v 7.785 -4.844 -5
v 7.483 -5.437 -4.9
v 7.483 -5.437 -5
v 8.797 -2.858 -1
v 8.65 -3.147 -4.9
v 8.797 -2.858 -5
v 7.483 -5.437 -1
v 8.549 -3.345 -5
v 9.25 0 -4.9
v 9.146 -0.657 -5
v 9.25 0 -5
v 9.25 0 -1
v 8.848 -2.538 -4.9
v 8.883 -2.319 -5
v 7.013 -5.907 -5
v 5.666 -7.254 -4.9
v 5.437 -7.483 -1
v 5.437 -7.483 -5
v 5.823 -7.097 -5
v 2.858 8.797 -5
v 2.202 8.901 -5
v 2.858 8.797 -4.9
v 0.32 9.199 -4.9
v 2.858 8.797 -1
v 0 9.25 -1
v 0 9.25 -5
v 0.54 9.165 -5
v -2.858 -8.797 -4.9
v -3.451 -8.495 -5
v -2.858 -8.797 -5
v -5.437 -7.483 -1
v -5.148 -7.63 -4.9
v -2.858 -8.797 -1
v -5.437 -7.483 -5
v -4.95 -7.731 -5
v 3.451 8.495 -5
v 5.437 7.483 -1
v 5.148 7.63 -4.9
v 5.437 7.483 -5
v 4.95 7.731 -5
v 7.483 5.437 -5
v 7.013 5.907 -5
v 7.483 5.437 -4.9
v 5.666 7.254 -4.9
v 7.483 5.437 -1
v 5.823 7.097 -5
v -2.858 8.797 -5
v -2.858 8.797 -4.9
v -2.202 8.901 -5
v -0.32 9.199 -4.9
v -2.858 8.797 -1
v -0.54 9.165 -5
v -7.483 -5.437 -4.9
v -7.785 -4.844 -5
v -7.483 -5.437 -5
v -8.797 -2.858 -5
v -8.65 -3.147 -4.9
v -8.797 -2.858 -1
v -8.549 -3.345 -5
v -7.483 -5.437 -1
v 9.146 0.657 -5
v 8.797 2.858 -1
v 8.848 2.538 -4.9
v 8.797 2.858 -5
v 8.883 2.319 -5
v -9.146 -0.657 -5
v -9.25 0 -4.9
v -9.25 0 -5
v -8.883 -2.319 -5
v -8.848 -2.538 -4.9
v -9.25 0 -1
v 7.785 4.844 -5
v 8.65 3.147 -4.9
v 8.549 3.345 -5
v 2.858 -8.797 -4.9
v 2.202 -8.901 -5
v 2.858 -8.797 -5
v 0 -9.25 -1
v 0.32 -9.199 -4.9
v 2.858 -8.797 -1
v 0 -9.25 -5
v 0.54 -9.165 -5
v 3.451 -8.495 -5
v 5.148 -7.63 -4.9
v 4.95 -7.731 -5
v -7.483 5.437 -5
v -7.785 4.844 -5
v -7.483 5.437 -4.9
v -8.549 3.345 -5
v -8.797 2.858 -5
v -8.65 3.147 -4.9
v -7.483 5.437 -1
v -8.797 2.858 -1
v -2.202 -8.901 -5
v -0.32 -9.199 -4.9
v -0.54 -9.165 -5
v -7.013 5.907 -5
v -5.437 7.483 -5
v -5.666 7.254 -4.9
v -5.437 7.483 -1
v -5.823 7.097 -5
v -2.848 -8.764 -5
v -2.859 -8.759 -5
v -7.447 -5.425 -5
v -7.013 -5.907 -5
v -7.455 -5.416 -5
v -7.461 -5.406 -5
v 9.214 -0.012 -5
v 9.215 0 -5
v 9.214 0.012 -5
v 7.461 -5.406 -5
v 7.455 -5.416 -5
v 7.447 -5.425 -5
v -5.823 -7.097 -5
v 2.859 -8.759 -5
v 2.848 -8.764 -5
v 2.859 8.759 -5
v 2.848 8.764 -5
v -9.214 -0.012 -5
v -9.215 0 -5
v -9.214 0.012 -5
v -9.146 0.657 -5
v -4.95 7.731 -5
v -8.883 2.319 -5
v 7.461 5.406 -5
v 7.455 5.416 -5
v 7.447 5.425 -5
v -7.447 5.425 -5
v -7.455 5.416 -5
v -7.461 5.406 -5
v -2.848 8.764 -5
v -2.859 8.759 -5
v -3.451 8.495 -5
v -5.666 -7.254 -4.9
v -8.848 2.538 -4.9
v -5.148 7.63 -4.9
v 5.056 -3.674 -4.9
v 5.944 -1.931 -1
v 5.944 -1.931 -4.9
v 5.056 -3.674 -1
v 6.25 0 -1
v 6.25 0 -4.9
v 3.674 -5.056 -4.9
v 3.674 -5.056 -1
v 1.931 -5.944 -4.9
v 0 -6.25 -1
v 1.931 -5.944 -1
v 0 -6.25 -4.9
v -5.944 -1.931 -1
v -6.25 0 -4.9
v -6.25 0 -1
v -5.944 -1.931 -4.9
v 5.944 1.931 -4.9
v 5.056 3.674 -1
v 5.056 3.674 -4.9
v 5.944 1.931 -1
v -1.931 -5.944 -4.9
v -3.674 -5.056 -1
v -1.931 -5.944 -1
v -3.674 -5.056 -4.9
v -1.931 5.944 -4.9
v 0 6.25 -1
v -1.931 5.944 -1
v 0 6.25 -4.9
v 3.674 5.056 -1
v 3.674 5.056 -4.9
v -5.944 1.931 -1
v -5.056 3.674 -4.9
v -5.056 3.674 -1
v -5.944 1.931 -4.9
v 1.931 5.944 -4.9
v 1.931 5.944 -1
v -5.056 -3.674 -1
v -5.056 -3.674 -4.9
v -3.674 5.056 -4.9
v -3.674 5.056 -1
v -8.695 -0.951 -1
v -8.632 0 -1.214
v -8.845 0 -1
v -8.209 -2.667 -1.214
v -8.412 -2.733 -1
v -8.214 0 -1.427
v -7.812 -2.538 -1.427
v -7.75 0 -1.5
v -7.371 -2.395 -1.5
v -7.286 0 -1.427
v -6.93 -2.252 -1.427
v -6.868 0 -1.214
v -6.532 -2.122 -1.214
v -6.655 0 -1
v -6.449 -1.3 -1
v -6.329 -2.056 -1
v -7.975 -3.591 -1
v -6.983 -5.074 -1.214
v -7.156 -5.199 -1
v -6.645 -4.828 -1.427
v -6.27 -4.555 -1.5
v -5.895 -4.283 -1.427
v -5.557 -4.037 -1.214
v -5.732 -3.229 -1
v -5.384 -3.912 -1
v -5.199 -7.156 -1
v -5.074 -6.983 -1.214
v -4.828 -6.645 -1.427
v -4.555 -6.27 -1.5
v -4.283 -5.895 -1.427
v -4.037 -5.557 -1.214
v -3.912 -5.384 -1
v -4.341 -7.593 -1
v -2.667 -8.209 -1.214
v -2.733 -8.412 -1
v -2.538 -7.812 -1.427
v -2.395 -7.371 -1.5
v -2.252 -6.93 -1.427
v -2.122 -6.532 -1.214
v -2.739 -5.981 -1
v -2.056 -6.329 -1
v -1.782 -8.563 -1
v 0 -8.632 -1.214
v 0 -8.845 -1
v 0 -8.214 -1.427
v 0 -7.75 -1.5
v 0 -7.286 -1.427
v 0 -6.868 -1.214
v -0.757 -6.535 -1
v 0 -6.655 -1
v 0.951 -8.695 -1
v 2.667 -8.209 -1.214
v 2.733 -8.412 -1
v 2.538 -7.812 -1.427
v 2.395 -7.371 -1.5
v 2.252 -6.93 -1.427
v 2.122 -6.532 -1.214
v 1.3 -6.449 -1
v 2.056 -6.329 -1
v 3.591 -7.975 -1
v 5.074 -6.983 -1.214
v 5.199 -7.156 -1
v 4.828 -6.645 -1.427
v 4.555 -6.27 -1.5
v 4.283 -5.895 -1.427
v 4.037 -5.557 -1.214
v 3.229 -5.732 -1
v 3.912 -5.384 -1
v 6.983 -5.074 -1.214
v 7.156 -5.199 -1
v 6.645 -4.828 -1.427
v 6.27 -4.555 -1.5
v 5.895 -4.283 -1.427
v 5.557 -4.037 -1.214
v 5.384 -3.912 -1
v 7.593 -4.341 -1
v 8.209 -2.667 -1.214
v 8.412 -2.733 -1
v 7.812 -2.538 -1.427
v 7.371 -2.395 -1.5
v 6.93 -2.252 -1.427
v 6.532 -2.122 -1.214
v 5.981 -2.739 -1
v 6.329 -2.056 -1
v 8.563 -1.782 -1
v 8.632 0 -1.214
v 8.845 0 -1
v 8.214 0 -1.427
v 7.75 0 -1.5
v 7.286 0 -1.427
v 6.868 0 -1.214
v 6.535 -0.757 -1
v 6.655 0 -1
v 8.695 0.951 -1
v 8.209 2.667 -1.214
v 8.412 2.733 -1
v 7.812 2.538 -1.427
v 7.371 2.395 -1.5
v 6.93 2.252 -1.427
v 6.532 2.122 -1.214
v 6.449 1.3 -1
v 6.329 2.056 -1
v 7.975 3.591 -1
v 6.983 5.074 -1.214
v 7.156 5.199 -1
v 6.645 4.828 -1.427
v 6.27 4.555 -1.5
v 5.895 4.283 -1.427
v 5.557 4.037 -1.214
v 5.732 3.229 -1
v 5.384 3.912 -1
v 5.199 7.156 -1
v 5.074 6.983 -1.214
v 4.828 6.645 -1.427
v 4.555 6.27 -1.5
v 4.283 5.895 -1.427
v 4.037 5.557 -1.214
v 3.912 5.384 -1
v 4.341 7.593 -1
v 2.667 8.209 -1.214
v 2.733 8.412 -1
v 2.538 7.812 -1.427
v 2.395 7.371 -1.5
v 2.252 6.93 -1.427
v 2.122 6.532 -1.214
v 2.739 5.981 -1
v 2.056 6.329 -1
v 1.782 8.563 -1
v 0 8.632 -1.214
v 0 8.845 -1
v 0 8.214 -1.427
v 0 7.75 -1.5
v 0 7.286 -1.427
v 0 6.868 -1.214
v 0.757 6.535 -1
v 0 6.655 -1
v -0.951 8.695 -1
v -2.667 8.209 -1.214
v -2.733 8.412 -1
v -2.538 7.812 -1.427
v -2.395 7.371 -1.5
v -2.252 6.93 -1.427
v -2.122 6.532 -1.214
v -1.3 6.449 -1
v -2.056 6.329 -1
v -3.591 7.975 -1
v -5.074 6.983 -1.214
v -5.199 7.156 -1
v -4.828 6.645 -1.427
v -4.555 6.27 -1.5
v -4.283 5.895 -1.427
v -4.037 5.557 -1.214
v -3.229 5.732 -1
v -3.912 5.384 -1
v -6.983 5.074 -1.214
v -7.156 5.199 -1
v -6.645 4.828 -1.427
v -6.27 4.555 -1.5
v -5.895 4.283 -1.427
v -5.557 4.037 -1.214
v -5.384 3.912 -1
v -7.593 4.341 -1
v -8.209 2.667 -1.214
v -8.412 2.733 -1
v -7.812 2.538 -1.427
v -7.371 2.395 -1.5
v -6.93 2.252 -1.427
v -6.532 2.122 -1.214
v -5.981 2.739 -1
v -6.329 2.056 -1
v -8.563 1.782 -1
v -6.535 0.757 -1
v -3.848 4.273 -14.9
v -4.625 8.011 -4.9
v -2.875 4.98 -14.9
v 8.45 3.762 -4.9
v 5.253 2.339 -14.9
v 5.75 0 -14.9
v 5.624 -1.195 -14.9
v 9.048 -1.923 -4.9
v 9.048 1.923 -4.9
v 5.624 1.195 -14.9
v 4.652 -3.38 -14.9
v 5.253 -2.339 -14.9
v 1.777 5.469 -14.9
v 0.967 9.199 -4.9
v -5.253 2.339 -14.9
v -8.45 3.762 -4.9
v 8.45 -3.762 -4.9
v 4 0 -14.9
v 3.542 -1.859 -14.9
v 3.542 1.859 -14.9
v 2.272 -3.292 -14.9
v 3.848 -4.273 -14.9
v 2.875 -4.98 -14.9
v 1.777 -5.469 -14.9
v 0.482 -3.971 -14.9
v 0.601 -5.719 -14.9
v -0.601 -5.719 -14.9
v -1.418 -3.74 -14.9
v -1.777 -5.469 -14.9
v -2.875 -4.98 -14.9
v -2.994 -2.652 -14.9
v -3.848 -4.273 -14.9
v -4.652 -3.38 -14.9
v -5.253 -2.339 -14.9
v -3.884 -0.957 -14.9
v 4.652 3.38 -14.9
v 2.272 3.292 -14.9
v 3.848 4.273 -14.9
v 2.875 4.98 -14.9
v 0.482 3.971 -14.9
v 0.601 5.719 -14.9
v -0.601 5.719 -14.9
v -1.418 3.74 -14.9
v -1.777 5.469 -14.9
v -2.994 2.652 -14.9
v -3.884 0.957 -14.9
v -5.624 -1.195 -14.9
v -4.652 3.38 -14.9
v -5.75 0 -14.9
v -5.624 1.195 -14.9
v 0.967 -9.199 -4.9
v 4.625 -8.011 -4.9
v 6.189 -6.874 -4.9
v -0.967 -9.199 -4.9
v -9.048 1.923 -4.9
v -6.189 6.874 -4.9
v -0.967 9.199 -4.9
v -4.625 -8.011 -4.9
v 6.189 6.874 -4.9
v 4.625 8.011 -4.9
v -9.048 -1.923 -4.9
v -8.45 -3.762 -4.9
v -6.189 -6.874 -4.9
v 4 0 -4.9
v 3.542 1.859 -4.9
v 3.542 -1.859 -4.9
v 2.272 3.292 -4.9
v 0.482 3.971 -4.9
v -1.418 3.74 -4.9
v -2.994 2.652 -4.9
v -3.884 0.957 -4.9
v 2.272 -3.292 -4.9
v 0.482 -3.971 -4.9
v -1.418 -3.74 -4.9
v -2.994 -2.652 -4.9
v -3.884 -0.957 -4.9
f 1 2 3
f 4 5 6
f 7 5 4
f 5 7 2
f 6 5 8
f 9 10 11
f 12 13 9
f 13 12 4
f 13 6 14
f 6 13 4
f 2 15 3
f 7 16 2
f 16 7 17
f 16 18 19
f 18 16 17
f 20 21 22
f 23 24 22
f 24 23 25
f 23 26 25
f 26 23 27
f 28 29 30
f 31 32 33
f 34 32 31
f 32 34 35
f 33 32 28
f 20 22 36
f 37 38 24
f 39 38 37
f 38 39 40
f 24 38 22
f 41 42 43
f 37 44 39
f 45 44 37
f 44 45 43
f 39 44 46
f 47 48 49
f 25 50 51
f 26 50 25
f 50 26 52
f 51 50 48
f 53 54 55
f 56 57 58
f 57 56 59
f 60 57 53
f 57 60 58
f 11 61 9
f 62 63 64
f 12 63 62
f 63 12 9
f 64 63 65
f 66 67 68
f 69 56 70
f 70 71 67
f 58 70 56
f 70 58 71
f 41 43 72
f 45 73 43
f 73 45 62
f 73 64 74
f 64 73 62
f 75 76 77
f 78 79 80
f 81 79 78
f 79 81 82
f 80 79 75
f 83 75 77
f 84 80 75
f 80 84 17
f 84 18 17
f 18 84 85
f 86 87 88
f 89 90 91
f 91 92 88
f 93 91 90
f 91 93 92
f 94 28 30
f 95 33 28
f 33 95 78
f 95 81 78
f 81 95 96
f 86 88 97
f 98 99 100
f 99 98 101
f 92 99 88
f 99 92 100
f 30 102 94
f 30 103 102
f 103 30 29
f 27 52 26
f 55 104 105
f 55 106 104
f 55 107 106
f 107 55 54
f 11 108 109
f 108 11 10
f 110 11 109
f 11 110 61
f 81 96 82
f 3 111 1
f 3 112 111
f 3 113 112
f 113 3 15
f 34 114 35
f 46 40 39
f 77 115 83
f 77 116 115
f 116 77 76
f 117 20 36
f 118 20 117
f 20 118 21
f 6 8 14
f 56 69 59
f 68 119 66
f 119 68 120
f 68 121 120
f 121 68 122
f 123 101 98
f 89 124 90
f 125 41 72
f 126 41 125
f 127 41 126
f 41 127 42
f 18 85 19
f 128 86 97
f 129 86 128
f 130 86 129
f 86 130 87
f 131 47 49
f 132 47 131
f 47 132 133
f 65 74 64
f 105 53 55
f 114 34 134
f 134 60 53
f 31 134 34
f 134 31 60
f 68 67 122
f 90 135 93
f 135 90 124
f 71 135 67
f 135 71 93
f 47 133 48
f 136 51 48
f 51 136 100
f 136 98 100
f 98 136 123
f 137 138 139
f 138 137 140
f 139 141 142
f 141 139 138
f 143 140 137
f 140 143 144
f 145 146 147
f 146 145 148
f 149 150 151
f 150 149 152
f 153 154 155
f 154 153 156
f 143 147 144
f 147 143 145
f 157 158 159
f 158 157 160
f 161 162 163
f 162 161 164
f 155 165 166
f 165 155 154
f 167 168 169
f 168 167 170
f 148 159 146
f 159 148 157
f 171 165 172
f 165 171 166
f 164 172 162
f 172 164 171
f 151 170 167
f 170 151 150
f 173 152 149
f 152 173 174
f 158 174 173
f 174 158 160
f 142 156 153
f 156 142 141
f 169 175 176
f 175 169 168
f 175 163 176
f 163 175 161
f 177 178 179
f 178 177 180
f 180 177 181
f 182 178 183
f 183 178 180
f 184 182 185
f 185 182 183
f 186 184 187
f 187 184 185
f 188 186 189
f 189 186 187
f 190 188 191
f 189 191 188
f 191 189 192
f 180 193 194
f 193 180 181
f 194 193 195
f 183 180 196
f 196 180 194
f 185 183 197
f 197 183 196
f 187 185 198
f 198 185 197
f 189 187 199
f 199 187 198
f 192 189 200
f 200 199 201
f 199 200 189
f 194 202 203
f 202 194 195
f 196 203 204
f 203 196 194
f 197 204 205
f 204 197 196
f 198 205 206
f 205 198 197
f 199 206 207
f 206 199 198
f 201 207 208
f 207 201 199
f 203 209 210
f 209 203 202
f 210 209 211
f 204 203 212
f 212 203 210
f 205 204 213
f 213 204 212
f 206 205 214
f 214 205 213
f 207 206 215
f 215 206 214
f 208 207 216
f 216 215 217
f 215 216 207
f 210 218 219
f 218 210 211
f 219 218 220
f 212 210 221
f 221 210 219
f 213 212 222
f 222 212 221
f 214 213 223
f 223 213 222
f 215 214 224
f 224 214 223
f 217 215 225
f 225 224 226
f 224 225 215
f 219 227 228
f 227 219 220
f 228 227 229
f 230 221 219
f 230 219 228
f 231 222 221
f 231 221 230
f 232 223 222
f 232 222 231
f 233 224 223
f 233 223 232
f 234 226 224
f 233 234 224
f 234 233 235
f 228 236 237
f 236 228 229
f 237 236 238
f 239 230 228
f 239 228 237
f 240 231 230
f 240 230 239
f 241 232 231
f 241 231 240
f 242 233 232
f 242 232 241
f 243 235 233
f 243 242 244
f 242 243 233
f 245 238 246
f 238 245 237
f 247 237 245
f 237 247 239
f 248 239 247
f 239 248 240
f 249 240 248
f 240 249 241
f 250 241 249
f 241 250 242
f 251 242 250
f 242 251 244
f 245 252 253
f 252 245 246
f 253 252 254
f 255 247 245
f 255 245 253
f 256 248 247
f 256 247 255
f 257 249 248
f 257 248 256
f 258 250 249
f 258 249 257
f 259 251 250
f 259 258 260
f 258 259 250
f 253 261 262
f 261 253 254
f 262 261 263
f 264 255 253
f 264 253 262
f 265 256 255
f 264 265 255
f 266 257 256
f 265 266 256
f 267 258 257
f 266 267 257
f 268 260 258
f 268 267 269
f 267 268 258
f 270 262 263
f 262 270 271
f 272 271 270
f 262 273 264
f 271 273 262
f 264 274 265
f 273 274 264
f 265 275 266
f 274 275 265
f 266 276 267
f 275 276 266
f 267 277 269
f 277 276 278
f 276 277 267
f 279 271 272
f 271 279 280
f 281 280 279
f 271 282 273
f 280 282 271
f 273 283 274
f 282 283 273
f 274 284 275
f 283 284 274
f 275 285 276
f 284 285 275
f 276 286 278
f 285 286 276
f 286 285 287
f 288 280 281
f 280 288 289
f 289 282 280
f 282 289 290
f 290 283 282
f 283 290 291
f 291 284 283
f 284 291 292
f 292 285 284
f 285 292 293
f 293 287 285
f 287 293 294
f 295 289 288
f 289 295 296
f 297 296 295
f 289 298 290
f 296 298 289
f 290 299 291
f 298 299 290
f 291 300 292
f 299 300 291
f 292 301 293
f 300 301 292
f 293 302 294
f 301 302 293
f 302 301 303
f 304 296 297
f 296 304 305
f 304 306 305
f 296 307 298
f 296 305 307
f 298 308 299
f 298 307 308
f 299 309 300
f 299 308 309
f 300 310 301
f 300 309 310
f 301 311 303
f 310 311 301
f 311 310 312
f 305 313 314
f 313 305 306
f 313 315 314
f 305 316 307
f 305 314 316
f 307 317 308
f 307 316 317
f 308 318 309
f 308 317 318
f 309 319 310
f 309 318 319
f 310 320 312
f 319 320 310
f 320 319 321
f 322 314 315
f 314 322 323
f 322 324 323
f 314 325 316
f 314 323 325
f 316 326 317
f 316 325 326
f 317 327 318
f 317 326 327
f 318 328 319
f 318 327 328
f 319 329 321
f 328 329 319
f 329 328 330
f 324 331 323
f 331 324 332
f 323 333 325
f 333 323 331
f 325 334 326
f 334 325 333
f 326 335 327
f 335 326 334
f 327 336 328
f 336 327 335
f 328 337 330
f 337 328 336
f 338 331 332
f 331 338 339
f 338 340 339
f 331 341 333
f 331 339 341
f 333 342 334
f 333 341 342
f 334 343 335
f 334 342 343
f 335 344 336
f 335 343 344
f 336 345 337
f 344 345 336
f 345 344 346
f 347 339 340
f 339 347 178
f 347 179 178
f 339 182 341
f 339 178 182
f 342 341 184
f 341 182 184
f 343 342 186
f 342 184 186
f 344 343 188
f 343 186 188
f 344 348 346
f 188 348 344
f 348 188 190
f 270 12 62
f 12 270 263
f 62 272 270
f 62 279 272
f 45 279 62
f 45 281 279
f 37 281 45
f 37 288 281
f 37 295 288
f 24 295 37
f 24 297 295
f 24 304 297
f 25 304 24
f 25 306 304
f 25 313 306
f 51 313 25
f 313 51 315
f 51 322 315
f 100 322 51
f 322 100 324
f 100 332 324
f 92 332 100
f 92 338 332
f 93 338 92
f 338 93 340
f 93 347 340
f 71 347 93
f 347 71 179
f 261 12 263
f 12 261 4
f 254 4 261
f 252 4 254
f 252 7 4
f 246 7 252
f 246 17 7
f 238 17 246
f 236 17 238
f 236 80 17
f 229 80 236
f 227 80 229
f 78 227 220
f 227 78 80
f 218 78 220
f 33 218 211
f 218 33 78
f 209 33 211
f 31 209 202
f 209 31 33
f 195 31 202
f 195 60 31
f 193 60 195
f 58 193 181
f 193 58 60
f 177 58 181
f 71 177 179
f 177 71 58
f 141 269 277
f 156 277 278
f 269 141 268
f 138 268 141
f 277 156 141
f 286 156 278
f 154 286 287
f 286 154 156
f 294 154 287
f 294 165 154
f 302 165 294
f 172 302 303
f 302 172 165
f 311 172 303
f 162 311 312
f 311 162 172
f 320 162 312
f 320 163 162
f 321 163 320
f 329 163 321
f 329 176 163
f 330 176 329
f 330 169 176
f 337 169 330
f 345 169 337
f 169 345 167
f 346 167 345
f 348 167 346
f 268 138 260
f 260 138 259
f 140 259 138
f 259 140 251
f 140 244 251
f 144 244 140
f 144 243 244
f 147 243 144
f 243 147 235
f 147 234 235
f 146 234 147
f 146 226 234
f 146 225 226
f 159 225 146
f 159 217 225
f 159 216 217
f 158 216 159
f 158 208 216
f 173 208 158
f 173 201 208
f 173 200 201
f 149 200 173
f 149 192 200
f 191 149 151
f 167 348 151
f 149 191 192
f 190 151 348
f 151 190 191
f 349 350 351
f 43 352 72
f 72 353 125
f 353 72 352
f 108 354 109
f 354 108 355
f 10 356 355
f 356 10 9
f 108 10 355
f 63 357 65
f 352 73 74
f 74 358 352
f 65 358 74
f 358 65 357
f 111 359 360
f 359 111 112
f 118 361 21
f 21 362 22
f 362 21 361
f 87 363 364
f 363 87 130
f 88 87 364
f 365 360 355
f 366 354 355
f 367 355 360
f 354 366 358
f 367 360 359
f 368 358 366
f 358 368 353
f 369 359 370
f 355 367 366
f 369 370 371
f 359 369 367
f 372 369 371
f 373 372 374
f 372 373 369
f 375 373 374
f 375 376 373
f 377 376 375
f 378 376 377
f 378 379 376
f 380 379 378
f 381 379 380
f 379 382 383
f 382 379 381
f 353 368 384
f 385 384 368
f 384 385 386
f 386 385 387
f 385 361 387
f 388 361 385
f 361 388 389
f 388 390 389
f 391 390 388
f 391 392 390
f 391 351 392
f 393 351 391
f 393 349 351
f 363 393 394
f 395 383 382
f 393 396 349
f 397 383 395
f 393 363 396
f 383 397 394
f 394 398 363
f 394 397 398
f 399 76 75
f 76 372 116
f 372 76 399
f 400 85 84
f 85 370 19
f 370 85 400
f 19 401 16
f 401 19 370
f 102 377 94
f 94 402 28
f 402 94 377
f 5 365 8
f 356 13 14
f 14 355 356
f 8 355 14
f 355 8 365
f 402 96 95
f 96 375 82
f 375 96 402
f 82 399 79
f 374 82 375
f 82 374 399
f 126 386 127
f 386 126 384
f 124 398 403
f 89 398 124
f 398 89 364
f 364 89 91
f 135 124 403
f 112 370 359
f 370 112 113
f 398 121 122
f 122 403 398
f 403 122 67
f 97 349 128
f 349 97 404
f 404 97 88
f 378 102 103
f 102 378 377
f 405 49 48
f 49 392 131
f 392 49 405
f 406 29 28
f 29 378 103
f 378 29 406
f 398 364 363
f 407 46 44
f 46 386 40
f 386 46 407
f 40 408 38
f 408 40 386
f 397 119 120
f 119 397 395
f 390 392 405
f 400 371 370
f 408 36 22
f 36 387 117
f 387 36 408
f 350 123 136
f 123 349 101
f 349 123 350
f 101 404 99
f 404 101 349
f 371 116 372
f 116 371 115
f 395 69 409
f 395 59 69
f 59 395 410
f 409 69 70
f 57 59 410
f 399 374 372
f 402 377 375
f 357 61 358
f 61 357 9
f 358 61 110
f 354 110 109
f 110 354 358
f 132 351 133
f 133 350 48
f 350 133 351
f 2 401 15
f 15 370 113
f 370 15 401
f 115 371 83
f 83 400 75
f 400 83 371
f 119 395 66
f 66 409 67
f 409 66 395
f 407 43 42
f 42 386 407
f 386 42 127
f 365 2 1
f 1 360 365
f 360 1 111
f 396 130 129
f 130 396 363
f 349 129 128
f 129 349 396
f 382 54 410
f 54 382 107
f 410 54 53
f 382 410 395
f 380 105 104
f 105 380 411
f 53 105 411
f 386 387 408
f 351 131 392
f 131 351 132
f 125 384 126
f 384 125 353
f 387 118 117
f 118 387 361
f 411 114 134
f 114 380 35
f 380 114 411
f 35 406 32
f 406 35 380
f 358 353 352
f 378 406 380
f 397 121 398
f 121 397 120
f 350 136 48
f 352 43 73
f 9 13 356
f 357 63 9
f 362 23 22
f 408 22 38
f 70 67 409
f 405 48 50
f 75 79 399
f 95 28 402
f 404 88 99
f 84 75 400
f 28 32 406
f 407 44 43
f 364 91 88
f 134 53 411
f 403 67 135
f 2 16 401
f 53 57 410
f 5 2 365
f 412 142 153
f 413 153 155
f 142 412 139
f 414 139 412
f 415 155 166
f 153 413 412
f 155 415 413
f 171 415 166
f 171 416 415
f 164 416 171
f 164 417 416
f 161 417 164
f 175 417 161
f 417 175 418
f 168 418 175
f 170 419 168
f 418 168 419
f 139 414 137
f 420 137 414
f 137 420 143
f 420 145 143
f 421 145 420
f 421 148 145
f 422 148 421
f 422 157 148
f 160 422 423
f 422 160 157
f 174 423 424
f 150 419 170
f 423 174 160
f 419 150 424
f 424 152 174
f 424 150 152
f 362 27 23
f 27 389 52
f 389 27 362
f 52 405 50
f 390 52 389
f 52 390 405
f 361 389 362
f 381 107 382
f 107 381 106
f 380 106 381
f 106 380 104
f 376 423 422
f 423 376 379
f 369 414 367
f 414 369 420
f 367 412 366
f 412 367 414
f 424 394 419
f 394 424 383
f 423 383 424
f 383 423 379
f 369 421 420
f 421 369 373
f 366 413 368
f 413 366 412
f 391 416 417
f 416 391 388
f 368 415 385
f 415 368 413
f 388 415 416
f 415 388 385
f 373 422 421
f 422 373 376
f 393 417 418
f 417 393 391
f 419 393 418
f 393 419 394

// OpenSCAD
// file: eggholder.scad
r_eggholder_ring = 15.5/2;
ri_eggholder_gummi = 3/2;

ri_eggholder_cyl = r_eggholder_ring - ri_eggholder_gummi;
ro_eggholder_cyl = r_eggholder_ring + ri_eggholder_gummi;
h_eggholder_cyl = 20;
h_eggholder_insideplate = 3;
mz_eggholder_insideplate = 3;
mz_eggholder_nemashaft_top = mz_eggholder_insideplate +h_eggholder_insideplate;

r_eggholder_shield=20;
h_eggholder_shield=4;

c_eggholder = "PeachPuff";

module eggholder_moveup(debug=true) {
    translate([0, 0, +mz_eggholder_nemashaft_top +h_nema_shaft])
    eggholder(debug);
}

module eggholder(debug=true) {

    color(c_eggholder)
    difference() {
        union() {

            // cylinder under gummi ring
            translate([0, 0, -h_eggholder_cyl])
            cylinder_with_hole(ri=ri_eggholder_cyl, ro=ro_eggholder_cyl,
                                h=h_eggholder_cyl, $fn=20);

            // protector agains brogen eggs
            color(c_eggholder)
            translate([0,0,-h_eggholder_cyl])
            cylinder(r=r_eggholder_shield, h=h_eggholder_shield);
        }

        // cut out torus for gummi
        torus(ri_eggholder_gummi, r_eggholder_ring);
        // smooth top of cylinder
        cube([2*ro_eggholder_cyl, 2*ro_eggholder_cyl, 2], center=true);

        // hole for nema shaft
        translate([0, 0, -mz_eggholder_nemashaft_top - h_nema_shaft ])
        nema17shaft();
    }


    // intermediate plate as max for motor shaft
    color(c_eggholder)
    translate([0, 0, -mz_eggholder_insideplate-h_eggholder_insideplate])
    cylinder(r=(ro_eggholder_cyl+ri_eggholder_cyl)/2,
             h=h_eggholder_insideplate);

    //// visible gummi ring
    //color(c_eggholder, 0.7)
    //torus(ri_eggholder_gummi, r_eggholder_ring);

    // visible nema shaft
    //color(c_eggholder, 0.7)
    //translate([0, 0, -mz_eggholder_nemashaft_top - h_nema_shaft ])
    //nema17shaft();
}

h_topeggholder_cyl1 = 5;
h_topeggholder_cyl2 = 10;
ro_topeggholder_cyl2 = 11.5/2;
ri_topeggholder_cyl2 = 4;

module topeggholder(debug=true) {
    color(c_eggholder)
    difference() {
        // cylinder under gummi ring
        translate([0, 0, 0])
        cylinder_with_hole(ri=ri_eggholder_cyl, ro=ro_eggholder_cyl,
                            h=h_topeggholder_cyl1, $fn=20);

        // cut out torus for gummi
        torus(ri_eggholder_gummi, r_eggholder_ring);
        // smooth top of cylinder
        cube([2*ro_eggholder_cyl, 2*ro_eggholder_cyl, 2], center=true);

    }

    // intermediate plate as max for shaft
    //translate([0, 0, mz_eggholder_insideplate])
    //cylinder(r=(ro_eggholder_cyl+ri_eggholder_cyl)/2,
    //         h=h_eggholder_insideplate);

    // visible gummi ring
    // color(c_eggholder, 0.7)
    // torus(ri_eggholder_gummi, r_eggholder_ring);

    // cylinder that touches to bearing
    color(c_eggholder)
    translate([0, 0, h_topeggholder_cyl1-0.1])
    difference() {
        cylinder(h=h_topeggholder_cyl2, r2=ro_topeggholder_cyl2,
                 r1 = ro_eggholder_cyl);
        translate([0, 0, -1])
        cylinder(h=h_topeggholder_cyl2+2, r=ri_topeggholder_cyl2);
    }

    if (debug) {
        cylinder_with_hole(ri=ri_topeggholder_cyl2, ro=ro_topeggholder_cyl2,
                            h=h_topeggholder_cyl2, $fn=20);
    }
}
// file: clamp.scad
module clamp(debug=true) {


    module lever(l_lever) {
        translate([-h_laserwood/2, 0, 0])
        rotate([90, 0, 90])
        linear_extrude(height=h_laserwood)
        polygon(points=[[0,0], // left bottom
                        [l_lever,0], // right bottom
                        [l_lever,h_lm8uu-5], // right top
                        [0,h_lm8uu]]); // left top

    }


    for(i = [-1, 1]) {
        rotate([90, 0, 0])
        translate([i*g_rod_centers/2, 0, 0])
        union() {
            bearing_with_mount(debug, c_clamp, a_clamp);
            //spring(height=g_clamp_topbar);
        }
    }

    l_lever = sqrt((g_bearing_mount_egg_y)*(g_bearing_mount_egg_y)
                   + g_rods_inner/2*g_rods_inner/2);


    color(c_clamp, a_clamp)
    translate([0, d_bearing_mount,0])
    union() {

        // connection peace between the two bearings
        w_connection_piece = (g_rods_inner - ro_lm8uu);
        translate([-g_bearing_mounts/2, -h_laserwood, 0])
        cube(size=[g_bearing_mounts, h_laserwood, l_bearing_mount], center=false);


        // egg top bearing holder
        translate([0, g_bearing_mount_egg_y, 0])
        union() {
            // z position of the bearing within the cylinder
            h_bearing_pos = (h_lm8uu-5)/2  - h_608zz/2;
            difference() {
                union() {
                    // cylinder that contains the 608zz
                    cylinder(h=h_lm8uu-5, r=14, center=false, $fn=20);

                    // the lever arms
                    for(i = [-1, 1]) {
                        translate([0, -g_bearing_mount_egg_y, 0])
                        translate([i*(g_rod_centers/2-15), -3, 0])
                        rotate([0, 0, i*10])
                        lever(l_lever);
                    }

                }

                // hole to insert 608zz bearing
                translate([0, 0, h_bearing_pos])
                k608zz_long();

                // hole to access 608zz bearing from top and bottom
                translate([0, 0, -h_lm8uu])
                cylinder(r=ri_608zz+2, h=2*h_lm8uu);
            }
            if (debug) {
                translate([0, 0, h_bearing_pos])
                k608zz();
            }
        }
    }

    if (debug) {
        // linear moving tooth
        translate([0, d_bearing_mount,0])
        union() {


            color(c_gears, a_gears)
            translate([g_bearing_mounts/2+w_bearing_mount-w_linearmoovingtooth, 0, -h_linearmoovingtooth+l_bearing_mount])
            cube(size=[w_linearmoovingtooth, d_gear, h_linearmoovingtooth], center=false);
        }
    }

}
// file: arm.scad
module arm_elevator_gear() {

    ri_screwheads_gap = r_gear * 0.57;
    ro_screwheads_gap = r_gear * 0.82;
    w_screwhead_gap_bridge = 10;

    difference() {
        // main
        cylinder(r=r_gear, h=d_gear);
        translate([0, 0, -1])
        cylinder(r=ro_screwheads_gap, h=d_gear + 2);
    }

    cylinder(r=ri_screwheads_gap, h=d_gear);


    for(i = [0, 1]) {
        rotate([0, 0, i*90])
        translate([-ro_screwheads_gap, -w_screwhead_gap_bridge/2, 0])
        cube(size=[ro_screwheads_gap*2, w_screwhead_gap_bridge, d_gear], center=false);
    }
}

module arm_elevator(debug=true) {

    for(i = [-1, 1]) {
        translate([i*g_rod_centers/2, 0, 0])
        union() {

            bearing_with_mount(debug);
        }
    }


    // plate to hold nema
    translate([0, 0, -d_bearing_mount])
    union() {
        difference() {
            translate([-g_bearing_mounts/2,0,0])
            cube([g_bearing_mounts, w_nema, d_arm_elevator_plate]);

            translate([0, w_nema/2, -1])
            union() {
                // hole for nema shaft
                cylinder(r=r_nema_big_cylinder, h=d_arm_elevator_plate+10);

                for(i=[-1,1]) {
                    for(j=[-1,1]) {
                        translate([i*31/2, j*31/2, 0])
                        cylinder(h=d_arm_elevator_plate+10, r=1, center=false, $fn=20);
                    }
                }
            }

        }
        if (debug) {
            // gear
            translate([0,w_nema/2,-d_gear])
            rotate([0,0,0])
            // color(c_gears, a_gears)
            arm_elevator_gear();
        }
    }

}


// | Motor Front
// | | 2mm Motor Front Cylinder Big
//   | | 4mm first holding plate
//     |   | 8mm gear ( 3mm depth, 2*0.5mm spacing)
//         |    | 13mm Housing outsite (5mm wood)
// |                   | 20mm End of shaft
//         |<  12mm   >| Shaft holding space
//         |<5 >|        Radius resticted holding space
//               |<5 >|  Lever body
//              || g_housingfront_lever
//               0

g_housingfront_lever = 1;
w_housingfront_slot = 14;
g_housingfront_arm = 1; // gap from lever arm to housing front

l_arm_second_extra_for_screw = 20;
h_nut = 4.7; // M5
w_nut = 8; // M5
ro_m5_screw = 4.2/2;

d_shaftholder_neg = g_gear + h_laserwood+g_housingfront_lever;
g_arm_hinge = 15;
d_arm_hinge_outer = d_arm_elevator_plate + 2;
w_arm_hinge_outer = 10;
h_arm_hinge_center = 12; // from housing front
r_arm_hinge_center_hole = ro_m5_screw;

ro_arm2_hinge = h_arm_hinge_center - g_housingfront_lever - h_arm_levers - 1;

w_arm2_wall = 2;

x_arm_servo = 20;

module arm() {


    // pen nema
    translate([0, 0, -g_armmotor_housingfront - h_nema])
    nema17();


    union() {

        // first part of arm
        arm1();

        // second part of arm
        translate([l_arm_rotating, 0, 0])
        rotate([90, 0, -90])
        arm2();


    }

}

module arm1_extra() {
    difference() {
        cylinder(h=d_shaftholder_neg + h_arm_levers,
                 r=w_housingfront_slot/2 - g_housingfront_arm);

        translate([0, 0, -d_gear-d_arm_elevator_plate])
        rotate([0, 0, 180])
        nema17shaft();
    }
}

module arm1(debug=true) {
        // the arm body

        difference() {
            union() {

                translate([-w_arm_levers/2, -w_arm_levers/2, g_housingfront_lever])
                cube(size=[l_arm_rotating + w_arm_levers/2 + w_arm_hinge_outer/2,
                           w_arm_levers,
                           h_arm_levers],
                           center=false);

            }

            translate([0, 0, -h_laserwood-d_gear-g_gear-d_arm_elevator_plate])
            rotate([0, 0, 180])
            nema17shaft();
        }

        // not printable, print seperate and glue
        if (debug) {
            // The reinforcement that connects the nema shaft to the arm
            translate([0, 0, -h_laserwood-g_gear])
            arm1_extra();
        }

        if (debug) {
            % translate([0, 0, -h_laserwood-d_gear-g_gear-d_arm_elevator_plate])
            rotate([0, 0, 180])
            nema17shaft();
        }

        // hinge
        translate([l_arm_rotating, 0, 0])
        for ( i = [-1, 1]) {
            translate([-w_arm_hinge_outer/2,
                      - d_arm_hinge_outer/2
                      + i*(g_arm_hinge/2 + d_arm_hinge_outer/2),
                      g_housingfront_arm])
            difference() {
                // hinge half cyl + stand
                union() {
                    cube(size=[w_arm_hinge_outer, d_arm_hinge_outer, 10], center=false);
                    rotate([-90, 0, 0])
                    translate([w_arm_hinge_outer/2, -h_arm_hinge_center + g_housingfront_arm, 0])
                        cylinder(h=d_arm_hinge_outer,
                            r=w_arm_hinge_outer/2, center=false, $fn=20);

                }
                // hinge screw hole
                rotate([-90, 0, 0])
                translate([w_arm_hinge_outer/2, -h_arm_hinge_center + g_housingfront_arm, -1])
                cylinder(h=d_arm_hinge_outer + 2,
                    r=r_arm_hinge_center_hole, center=false, $fn=20);
            }
        }


        // servo
        translate([x_arm_servo, -w_arm_levers/2 + h_servo_mount, 0])
        rotate([0,0, -90])
        translate([0, 0, h_arm_levers + g_housingfront_lever])
        servo_mount(debug);
}


module arm2(debug=true) {



    difference() {
        union() {
            // body
            translate([-g_arm_hinge/2, h_arm_hinge_center, -ro_arm2_hinge])
            cube(size=[g_arm_hinge,
                       l_arm_second + l_arm_second_extra_for_screw - h_arm_hinge_center,
                       ro_arm2_hinge*2],
                       center=false);

            // hinge cylinder
            translate([0, h_arm_hinge_center, 0])
            rotate([0, 90, 0])
            cylinder(h=g_arm_hinge, r=ro_arm2_hinge, center=true, $fn=20);

        }

        union() {

            // hinge hole
            translate([0, h_arm_hinge_center, 0])
            rotate([0, 90, 0])
            cylinder(h=g_arm_hinge + 1, r=r_arm_hinge_center_hole, center=true, $fn=20);

            rotate([0,180,0])
            translate([0, l_arm_second, -l_pen_standout])
            pen_ext();

            // hole for M5 nut
            translate([0, l_arm_second + 14, 0])
            cube([w_nut, h_nut, ro_arm2_hinge*2+1], center=true);

            // hole for m5 screw
            translate([0, l_arm_second + 20, 0])
            rotate([90, 0, 0])
            cylinder(h=20, r=ro_m5_screw, center=true, $fn=20);

            // material saving hole
            translate([0,
                       h_arm_hinge_center + ro_arm2_hinge
                       + (l_arm_second-25)/2,
                       w_arm2_wall])
            cube(size=[g_arm_hinge - 2*w_arm2_wall, l_arm_second-25, ro_arm2_hinge*2], center=true);

        }

    }

    if (debug) {
        // example pen
        rotate([0,180,0])
        % translate([0, l_arm_second, -l_pen_standout])
        pen();
    }
}
// file: small_stuff.scad
module pen() {
    translate([0, 0, l_pen_tip])
    cylinder(h=l_pen, r=r_pen, center=false, $fn=20);

    cylinder(h=l_pen_tip, r1=0, r2=r_pen, center=false, $fn=20);
}

module pen_ext() {
    translate([0, 0, l_pen_tip])
    cylinder(h=l_pen, r=r_pen, center=false, $fn=20);

    translate([-r_pen, 0, l_pen_tip])
    cube([r_pen*2, r_pen*2, l_pen]);

    cylinder(h=l_pen_tip, r1=0, r2=r_pen, center=false, $fn=20);
}

module egg() {

    translate([0, 0, r_egg])
    hull() {
        sphere(r_egg);

        translate([0,0,r_egg*0.7])
        sphere(r_egg*0.7);
    }

    echo(str("Eihöhe: ", h_egg, " mm"));
}

module k608zz() {
    color("red", 0.5)
    cylinder(r=ro_608zz, h=h_608zz);
}

module k608zz_long() {
    hull() {
        translate([0, -50, 0])
        k608zz();
        k608zz();
    }
}

module rods() {
    for(i=[-1,1]) {
        translate([i*x_rod, 0, 0])
        cylinder(h=h_rods, r=r_rods, center=false, $fn=20);
    }
}

module bearing(ri=ri_lm8uu, ro=ro_lm8uu, h=h_lm8uu) {
    cylinder_with_hole(ri, ro, h);
}

module cylinder_with_hole(ri=ri_lm8uu, ro=ro_lm8uu, h=h_lm8uu) {
    // LM8UU   8 mm    15 mm   24 mm
    difference() {
        cylinder(h=h, r=ro);
        translate([0, 0, -1])
        cylinder(h=h+2, r=ri);
    }
}

module spring(height=50, radius=8, rounds=8) {
    color("orange")
    linear_extrude(height = height,
                   center = false,
                   convexity = 10,
                   twist = 360*rounds)
    translate([radius, 0, 0])
    circle(r = 1);
}

module bearing_with_mount(debug=true,c="red",a=1.0) {
    translate([0, h_lm8uu+3, 0])
    union() {
        if (debug) {
            rotate([90, 0, 0])
            bearing();
        }

        color(c, a)
        translate([0, -h_lm8uu/2, -d_bearing_mount])
        rotate([0, 0, 90])
        bearingMount();
    }
}

module servo_mount(show_servo=1) {

    difference() {
        translate([0, -w_servo_mount/2, 0])
        cube([h_servo_mount, w_servo_mount, d_servo]);
        union() {
            translate([-1, -w_servo/2, -1])
            cube([h_servo_mount+2, w_servo, d_servo+2]);

            for(i = [-1, 1]) {
                translate([1, i*g_servo_screws/2, d_servo/2])
                rotate([0, 90, 0])
                cylinder(h=h_servo_mount+2, r=1, center=true, $fn=20);
            }
        }
    }

    if (show_servo) {
        translate([15.9, w_servo/2, 0])
        rotate([90, 0, -90])
        servoSG90();
    }

}
// file: lm8uumount.scad
module bearingMount() {
	lm10uumount();
}

module lm8uumount() {
	mountLength=29;
	mountWidth=22;
	mountHeight=15.5;
	cableTieWidth=5;
	bearingLength=24.5;
	bearingDiameter=16;
	rodClearance=13;

	difference() {
		// mount cube
		translate([0,0,mountHeight/2]) cube([mountLength,mountWidth,mountHeight],center=true);
		union() {
			//clearance hole
			translate([0,0,11.5]) rotate([0,90,0]) cylinder(mountLength+1,rodClearance/2,rodClearance/2,center=true);
			translate([0,0,16.5]) rotate([0,90,0]) cube([rodClearance,rodClearance,mountLength+1],center=true);

			// bearing hole
			translate([0,0,11.5]) rotate([0,90,0]) cylinder(bearingLength,bearingDiameter/2,bearingDiameter/2,center=true);
			translate([0,0,16.5]) rotate([0,90,0]) cube([bearingDiameter-1,bearingDiameter-1,bearingLength],center=true);
			// cable clip hole
			translate([0,0,15]) rotate([0,90,0]) cube([14,mountWidth+1,cableTieWidth],center=true);
			translate([0,0,0]) rotate([0,90,0]) cube([7,mountWidth+1,cableTieWidth],center=true);
			translate([0,0,0]) rotate([0,90,0]) cube([12,12,cableTieWidth],center=true);
		}
	}
}

module lm10uumount() {
	mountLength=35;
	mountWidth=24;
	mountHeight=17.5;
	cableTieWidth=5;
	bearingLength=30;
	bearingDiameter=20;
	rodClearance=13;

	difference() {
		// mount cube
		translate([0,0,mountHeight/2]) cube([mountLength,mountWidth,mountHeight],center=true);
		union() {
			//clearance hole
			translate([0,0,11.5]) rotate([0,90,0]) cylinder(mountLength+1,rodClearance/2,rodClearance/2,center=true);
			translate([0,0,16.5]) rotate([0,90,0]) cube([rodClearance,rodClearance,mountLength+1],center=true);

			// bearing hole
			translate([0,0,11.5]) rotate([0,90,0]) cylinder(bearingLength,bearingDiameter/2,bearingDiameter/2,center=true);
			translate([0,0,16.5]) rotate([0,90,0]) cube([bearingDiameter-1,bearingDiameter-1,bearingLength],center=true);
			// cable clip hole
			translate([0,0,15]) rotate([0,90,0]) cube([14,mountWidth+1,cableTieWidth],center=true);
			translate([0,0,0]) rotate([0,90,0]) cube([7,mountWidth+1,cableTieWidth],center=true);
			translate([0,0,0]) rotate([0,90,0]) cube([12,12,cableTieWidth],center=true);
		}
	}
}
// file: servosg90.scad
module servoSG90() {
    L = 22.8;
    l = 12.6;
    h = 22.8;
    plateL = 32.5;
    plateH = 2.7;
    plateHPos = 16;
    topCylinderH = 3.4;
    smallTopCylinderD = 4.5;

    axisH = 2;
    axisD = 4;

    screwHoleCenter=2;
    screwHoleD=2;
    holeSize=1;

    difference() {
        union() {
            color("LightBlue", 1) {
                // main part
                cube([L, l, h]);
                // support
                translate([-(plateL - L) / 2, 0, plateHPos]) {
                    cube([plateL, l, plateH]);
                }
                // top big cylinder
                translate([l/2,l/2,h]) {
                    cylinder(d=l, h=topCylinderH, $fn=20);
                }
                // top small cylinder
                translate([l, l/2, h]) {
                    cylinder(d=smallTopCylinderD, h=topCylinderH, $fn=20);
                }
            }
            translate([l/2,l/2, h + topCylinderH]) {
                color("white") {
                    cylinder(d=axisD,h=axisH, $fn=20);
                }
            }
        }
        translate([-(plateL - L) / 2 + screwHoleCenter, l/2, plateHPos]) {
            cylinder(d=screwHoleD, h=10, $fn=20, center=true);
        }
        translate([-(plateL - L) / 2 - 1, l / 2 - holeSize / 2, plateHPos - 1]) {
            cube([3,holeSize,4]);
        }
        translate([plateL - (plateL - L) / 2 - screwHoleCenter, l / 2, plateHPos - 1]) {
            cylinder(d=screwHoleD, h=10, $fn=20, center=true);
        }
        translate([plateL- (plateL - L) / 2 - screwHoleCenter, l / 2 - holeSize / 2, plateHPos -1]) {
            cube([3,holeSize,4]);
        }
    }
}

//servoSG90();
// file: Nema17.scad
//Quick design of a NEMA 17 (SM-42BYG011-25) motor


module nema17shaft(h=20) {
    difference() {
        translate([0, 0, 0]) cylinder(h=h, r=2.5, $fn=24);

        translate([-5, 2, h-15])
        cube([10, 10, 15]);
    }

}

module nema17(motor_height = 34.0) {



	difference(){
        //motor
		union(){
			translate([0,0,motor_height/2]){
				intersection(){
					cube([42.3,42.3,motor_height], center = true);
					rotate([0,0,45])
                    translate([0,0,-1])
                    cube([74.3*sin(45), 73.3*sin(45) ,motor_height+2], center = true);
				}
			}
            translate([0, 0, motor_height]) cylinder(h=2, r=11, $fn=24);
			translate([0, 0, motor_height]) nema17shaft();

		}
        //screw holes
		for(i=[0:3]){
				rotate([0, 0, 90*i])
                translate([15.5, 15.5, motor_height-4.5])
                cylinder(h=5, r=1.5, $fn=24);
		}
	}
}

nema17();
// main file
use <Nema17.scad>
use <servosg90.scad>
//use <gears_spur.scad>
use <lm8uumount.scad>

// w width
// d depth
// h height
// l length
// r radius
// ri inner
// ro outer
// g gap
// s size (3array)
// c color
// a alpha
// x pos x
// y pos y
// z pos z
// mx, my, mz minus pos x,y,z
// all in mm

h_laserwood = 5;

w_groundplate = 300;
d_groundplate = 300;

h_pos_egg_center = 85;

w_nema = 42.3;
h_nema = 34;
h_nema_shaft = 20;
r_nema_big_cylinder = 12;

r_egg = 45/2;
z_egg_pos = 60;
h_egg = r_egg+2*0.7*r_egg;

w_bearing_mount = 22;
d_bearing_mount = 11.5; // from bearing center to mount front
l_bearing_mount = 29;

l_pen = 130;
l_pen_tip = 10;
r_pen = 10/2;

y_egg_center = 50;

d_gear = 3;
c_gears = "DarkOrchid";
a_gears = 1;
g_gear = 1; // 2*0.5

d_arm_elevator_plate = 4;

h_arm_levers = 5;
w_arm_levers = 25;

l_arm_rotating = 45;
l_arm_second = y_egg_center;
l_pen_standout = 20;
g_armmotor_housingfront = h_laserwood + d_gear + g_gear + d_arm_elevator_plate;

// LM8UU   8 mm    15 mm   24 mm
// LM10UU 10 mm    19 mm   29 mm
h_lm8uu = 29; // h_lm8uu = 24;
ri_lm8uu = 10/2; // ri_lm8uu = 8/2;
ro_lm8uu = 19/2; // ro_lm8uu = 15/2;

ro_608zz = 22/2;
ri_608zz = 8/2;
h_608zz = 7;

h_servo_mount = 3;
w_servo = 23;
d_servo = 11.8;
g_servo_screws = 27.5;
w_servo_mount = g_servo_screws + 5;


h_rods = 200;
g_rods_inner = w_nema + w_bearing_mount;
r_rods = 4;
g_rod_centers = g_rods_inner + r_rods;
my_rod = d_bearing_mount + d_gear + g_gear + h_laserwood;
x_rod = g_rod_centers/2;


// distance between two bearing mounts that slide the rods
g_bearing_mounts = g_rod_centers - w_bearing_mount;

// dostance from bearing mount front to egg center
g_bearing_mount_egg_y = y_egg_center + my_rod - d_bearing_mount;

h_clamp_pos = 130;
c_clamp = "Olive";
a_clamp = 1;


h_linearmoovingtooth = 130;
// then they meet in front of the rod
w_linearmoovingtooth = w_bearing_mount/2;

r_gear = g_rod_centers/2;
echo("Big gear radius: ", r_gear);
echo("Side rods width: ", w_linearmoovingtooth);

// block1 is the lower block and holds the rods.
w_block1 = 90; // raspberry pi mount width
d_block1 = h_nema + 10;
h_block1 = 50;

// block2 is a mounting plate at the back of block 1
w_block2 = w_block1;
d_block2 = h_laserwood;
h_block2 = 160;
d_block2_back_position = -d_block2-my_rod+d_bearing_mount - d_block1;

w_tower = g_rods_inner + 2*r_rods + 2*h_laserwood + 25;
d_tower = 80;
h_tower = 110;
s_tower = [w_tower, d_tower, h_tower];
s_tower_inner = [w_tower - 2*h_laserwood,
                 d_tower - 2*h_laserwood,
                 h_tower - h_laserwood];


r_rope = 2;
c_rope = "red";

g_clamp_topbar = h_rods-h_clamp_pos-h_lm8uu;


w_numpad_button = 10;
g_numpad_button = 3;
c_numpad_button = "WhiteSmoke";
w_numpad = 3*w_numpad_button+4*g_numpad_button;
d_numpad = 4*w_numpad_button+5*g_numpad_button;
c_numpad = "Silver";


include <small_stuff.scad>
include <arm.scad>
include <clamp.scad>
include <eggholder.scad>


//translate([-100, 0, 0])
//assembly();

//lay_out();
print();

//translate([0, 0, -10])
//eggholder();

//translate([0, 0, 0])
//topeggholder();

module print() {

    // print with support material
//   translate([0, 140, 0])
//   clamp(false);

//    translate([80, 80, 0])
//   arm_elevator(false);
//
//   translate([0, -40, 0])
//   arm1(false);
//   arm2(false);
//
//   arm1_extra();
//
//   translate([60, 40, 0])
//    eggholder_moveup(false);
//
//   translate([30, 0, 0])
   rotate([180, 0, 0])
    topeggholder(false);

}

module lay_out() {

   translate([0, -140, 0])
   clamp();

   translate([100, 0, 0])
   numpad();

   translate([80, 80, 0])
   arm_elevator();

   translate([160, 80, 0])
   arm();

   translate([0, -40, 0])
   arm1();
   arm2();

   translate([40, 160, 0])
   bearingMount();

translate([-20, -20, 0])
servo_mount();

    translate([-473, -80, -22])
    import("vertical_ARM_v2.stl");

    translate([-1207, 850, 29])
    import("pen_holder_v3.stl");
}

module assembly() {

    eggbot();

    // rotate([0, 0, 180])
    //translate([0, d_block2_back_position, 30])
    //pi();

}

module pi() {
    translate([-41.5, 0, 0])
    rotate([90, 0, 0])
    union() {
        //translate([4, 103, 24.5])
        //rotate([180, 0, 0])
        //import("pi_top.stl");

        import("pi_bottom.stl");
    }
}

module groundplate() {
    translate([0,0,-5])
    cube([w_groundplate, w_groundplate, 10], center=true);
}


module eggbot() {
    translate([0, l_arm_second, z_egg_pos])
    egg();
    translate([0, l_arm_second, 0])
    union() {
       nema17();
       translate([0, 0, 34])
       eggholder_moveup();
    }

    translate([0, 0, h_pos_egg_center])
    rotate([90, 0, 180])
    arm();

    translate([0, -my_rod, h_pos_egg_center-w_nema/2])
    rotate([90, 0, 0])
    arm_elevator();

    translate([0, -my_rod, 0])
    rods();


    translate([0, -my_rod, h_clamp_pos])
    clamp();

    translate([0, y_egg_center, z_egg_pos+h_egg])
    topeggholder();

    block1();
    block2();

}


module block1() {
    color("LightBlue", 0.4) {
        translate([-w_block1/2, -d_block1-my_rod+d_bearing_mount, 0])
        cube(size=[w_block1, d_block1, h_block1], center=false);
    }
    color(c_gears, a_gears) {
        translate([-w_block1/2, -my_rod+d_bearing_mount, 0])
        cube(size=[w_linearmoovingtooth, d_gear, h_linearmoovingtooth], center=false);
    }
}

module block2() {
    color("LightBlue", 0.4) {
        translate([-w_block2/2, d_block2_back_position, 0])
        cube(size=[w_block2, d_block2, h_block2], center=false);
    }
}

module housing() {
    color("LightBlue", 0.4) {
        translate([-w_tower/2, -d_tower-1, 0])
        difference() {
            cube(size=s_tower, center=false);

            translate([h_laserwood, h_laserwood, 0])
            cube(size=s_tower_inner, center=false);
        }
    }
}

module numpad() {
    translate([g_numpad_button, g_numpad_button, 0])
    color(c_numpad_button)
    for( x = [0 : 2] ) {
        for (y = [0 : 3]) {
            translate([x*(w_numpad_button + g_numpad_button),
                       y*(w_numpad_button + g_numpad_button),
                       0])
            cube(size=[w_numpad_button,
                       w_numpad_button,
                       4], center=false);
        }
    }
    color(c_numpad)
    cube(size=[w_numpad, d_numpad, 2]);
}


module torus(ri=2, ro=7) {
    rotate_extrude(convexity = 10, $fn = 20)
    translate([ro, 0, 0])
    circle(r = ri, $fn = 20);
}
